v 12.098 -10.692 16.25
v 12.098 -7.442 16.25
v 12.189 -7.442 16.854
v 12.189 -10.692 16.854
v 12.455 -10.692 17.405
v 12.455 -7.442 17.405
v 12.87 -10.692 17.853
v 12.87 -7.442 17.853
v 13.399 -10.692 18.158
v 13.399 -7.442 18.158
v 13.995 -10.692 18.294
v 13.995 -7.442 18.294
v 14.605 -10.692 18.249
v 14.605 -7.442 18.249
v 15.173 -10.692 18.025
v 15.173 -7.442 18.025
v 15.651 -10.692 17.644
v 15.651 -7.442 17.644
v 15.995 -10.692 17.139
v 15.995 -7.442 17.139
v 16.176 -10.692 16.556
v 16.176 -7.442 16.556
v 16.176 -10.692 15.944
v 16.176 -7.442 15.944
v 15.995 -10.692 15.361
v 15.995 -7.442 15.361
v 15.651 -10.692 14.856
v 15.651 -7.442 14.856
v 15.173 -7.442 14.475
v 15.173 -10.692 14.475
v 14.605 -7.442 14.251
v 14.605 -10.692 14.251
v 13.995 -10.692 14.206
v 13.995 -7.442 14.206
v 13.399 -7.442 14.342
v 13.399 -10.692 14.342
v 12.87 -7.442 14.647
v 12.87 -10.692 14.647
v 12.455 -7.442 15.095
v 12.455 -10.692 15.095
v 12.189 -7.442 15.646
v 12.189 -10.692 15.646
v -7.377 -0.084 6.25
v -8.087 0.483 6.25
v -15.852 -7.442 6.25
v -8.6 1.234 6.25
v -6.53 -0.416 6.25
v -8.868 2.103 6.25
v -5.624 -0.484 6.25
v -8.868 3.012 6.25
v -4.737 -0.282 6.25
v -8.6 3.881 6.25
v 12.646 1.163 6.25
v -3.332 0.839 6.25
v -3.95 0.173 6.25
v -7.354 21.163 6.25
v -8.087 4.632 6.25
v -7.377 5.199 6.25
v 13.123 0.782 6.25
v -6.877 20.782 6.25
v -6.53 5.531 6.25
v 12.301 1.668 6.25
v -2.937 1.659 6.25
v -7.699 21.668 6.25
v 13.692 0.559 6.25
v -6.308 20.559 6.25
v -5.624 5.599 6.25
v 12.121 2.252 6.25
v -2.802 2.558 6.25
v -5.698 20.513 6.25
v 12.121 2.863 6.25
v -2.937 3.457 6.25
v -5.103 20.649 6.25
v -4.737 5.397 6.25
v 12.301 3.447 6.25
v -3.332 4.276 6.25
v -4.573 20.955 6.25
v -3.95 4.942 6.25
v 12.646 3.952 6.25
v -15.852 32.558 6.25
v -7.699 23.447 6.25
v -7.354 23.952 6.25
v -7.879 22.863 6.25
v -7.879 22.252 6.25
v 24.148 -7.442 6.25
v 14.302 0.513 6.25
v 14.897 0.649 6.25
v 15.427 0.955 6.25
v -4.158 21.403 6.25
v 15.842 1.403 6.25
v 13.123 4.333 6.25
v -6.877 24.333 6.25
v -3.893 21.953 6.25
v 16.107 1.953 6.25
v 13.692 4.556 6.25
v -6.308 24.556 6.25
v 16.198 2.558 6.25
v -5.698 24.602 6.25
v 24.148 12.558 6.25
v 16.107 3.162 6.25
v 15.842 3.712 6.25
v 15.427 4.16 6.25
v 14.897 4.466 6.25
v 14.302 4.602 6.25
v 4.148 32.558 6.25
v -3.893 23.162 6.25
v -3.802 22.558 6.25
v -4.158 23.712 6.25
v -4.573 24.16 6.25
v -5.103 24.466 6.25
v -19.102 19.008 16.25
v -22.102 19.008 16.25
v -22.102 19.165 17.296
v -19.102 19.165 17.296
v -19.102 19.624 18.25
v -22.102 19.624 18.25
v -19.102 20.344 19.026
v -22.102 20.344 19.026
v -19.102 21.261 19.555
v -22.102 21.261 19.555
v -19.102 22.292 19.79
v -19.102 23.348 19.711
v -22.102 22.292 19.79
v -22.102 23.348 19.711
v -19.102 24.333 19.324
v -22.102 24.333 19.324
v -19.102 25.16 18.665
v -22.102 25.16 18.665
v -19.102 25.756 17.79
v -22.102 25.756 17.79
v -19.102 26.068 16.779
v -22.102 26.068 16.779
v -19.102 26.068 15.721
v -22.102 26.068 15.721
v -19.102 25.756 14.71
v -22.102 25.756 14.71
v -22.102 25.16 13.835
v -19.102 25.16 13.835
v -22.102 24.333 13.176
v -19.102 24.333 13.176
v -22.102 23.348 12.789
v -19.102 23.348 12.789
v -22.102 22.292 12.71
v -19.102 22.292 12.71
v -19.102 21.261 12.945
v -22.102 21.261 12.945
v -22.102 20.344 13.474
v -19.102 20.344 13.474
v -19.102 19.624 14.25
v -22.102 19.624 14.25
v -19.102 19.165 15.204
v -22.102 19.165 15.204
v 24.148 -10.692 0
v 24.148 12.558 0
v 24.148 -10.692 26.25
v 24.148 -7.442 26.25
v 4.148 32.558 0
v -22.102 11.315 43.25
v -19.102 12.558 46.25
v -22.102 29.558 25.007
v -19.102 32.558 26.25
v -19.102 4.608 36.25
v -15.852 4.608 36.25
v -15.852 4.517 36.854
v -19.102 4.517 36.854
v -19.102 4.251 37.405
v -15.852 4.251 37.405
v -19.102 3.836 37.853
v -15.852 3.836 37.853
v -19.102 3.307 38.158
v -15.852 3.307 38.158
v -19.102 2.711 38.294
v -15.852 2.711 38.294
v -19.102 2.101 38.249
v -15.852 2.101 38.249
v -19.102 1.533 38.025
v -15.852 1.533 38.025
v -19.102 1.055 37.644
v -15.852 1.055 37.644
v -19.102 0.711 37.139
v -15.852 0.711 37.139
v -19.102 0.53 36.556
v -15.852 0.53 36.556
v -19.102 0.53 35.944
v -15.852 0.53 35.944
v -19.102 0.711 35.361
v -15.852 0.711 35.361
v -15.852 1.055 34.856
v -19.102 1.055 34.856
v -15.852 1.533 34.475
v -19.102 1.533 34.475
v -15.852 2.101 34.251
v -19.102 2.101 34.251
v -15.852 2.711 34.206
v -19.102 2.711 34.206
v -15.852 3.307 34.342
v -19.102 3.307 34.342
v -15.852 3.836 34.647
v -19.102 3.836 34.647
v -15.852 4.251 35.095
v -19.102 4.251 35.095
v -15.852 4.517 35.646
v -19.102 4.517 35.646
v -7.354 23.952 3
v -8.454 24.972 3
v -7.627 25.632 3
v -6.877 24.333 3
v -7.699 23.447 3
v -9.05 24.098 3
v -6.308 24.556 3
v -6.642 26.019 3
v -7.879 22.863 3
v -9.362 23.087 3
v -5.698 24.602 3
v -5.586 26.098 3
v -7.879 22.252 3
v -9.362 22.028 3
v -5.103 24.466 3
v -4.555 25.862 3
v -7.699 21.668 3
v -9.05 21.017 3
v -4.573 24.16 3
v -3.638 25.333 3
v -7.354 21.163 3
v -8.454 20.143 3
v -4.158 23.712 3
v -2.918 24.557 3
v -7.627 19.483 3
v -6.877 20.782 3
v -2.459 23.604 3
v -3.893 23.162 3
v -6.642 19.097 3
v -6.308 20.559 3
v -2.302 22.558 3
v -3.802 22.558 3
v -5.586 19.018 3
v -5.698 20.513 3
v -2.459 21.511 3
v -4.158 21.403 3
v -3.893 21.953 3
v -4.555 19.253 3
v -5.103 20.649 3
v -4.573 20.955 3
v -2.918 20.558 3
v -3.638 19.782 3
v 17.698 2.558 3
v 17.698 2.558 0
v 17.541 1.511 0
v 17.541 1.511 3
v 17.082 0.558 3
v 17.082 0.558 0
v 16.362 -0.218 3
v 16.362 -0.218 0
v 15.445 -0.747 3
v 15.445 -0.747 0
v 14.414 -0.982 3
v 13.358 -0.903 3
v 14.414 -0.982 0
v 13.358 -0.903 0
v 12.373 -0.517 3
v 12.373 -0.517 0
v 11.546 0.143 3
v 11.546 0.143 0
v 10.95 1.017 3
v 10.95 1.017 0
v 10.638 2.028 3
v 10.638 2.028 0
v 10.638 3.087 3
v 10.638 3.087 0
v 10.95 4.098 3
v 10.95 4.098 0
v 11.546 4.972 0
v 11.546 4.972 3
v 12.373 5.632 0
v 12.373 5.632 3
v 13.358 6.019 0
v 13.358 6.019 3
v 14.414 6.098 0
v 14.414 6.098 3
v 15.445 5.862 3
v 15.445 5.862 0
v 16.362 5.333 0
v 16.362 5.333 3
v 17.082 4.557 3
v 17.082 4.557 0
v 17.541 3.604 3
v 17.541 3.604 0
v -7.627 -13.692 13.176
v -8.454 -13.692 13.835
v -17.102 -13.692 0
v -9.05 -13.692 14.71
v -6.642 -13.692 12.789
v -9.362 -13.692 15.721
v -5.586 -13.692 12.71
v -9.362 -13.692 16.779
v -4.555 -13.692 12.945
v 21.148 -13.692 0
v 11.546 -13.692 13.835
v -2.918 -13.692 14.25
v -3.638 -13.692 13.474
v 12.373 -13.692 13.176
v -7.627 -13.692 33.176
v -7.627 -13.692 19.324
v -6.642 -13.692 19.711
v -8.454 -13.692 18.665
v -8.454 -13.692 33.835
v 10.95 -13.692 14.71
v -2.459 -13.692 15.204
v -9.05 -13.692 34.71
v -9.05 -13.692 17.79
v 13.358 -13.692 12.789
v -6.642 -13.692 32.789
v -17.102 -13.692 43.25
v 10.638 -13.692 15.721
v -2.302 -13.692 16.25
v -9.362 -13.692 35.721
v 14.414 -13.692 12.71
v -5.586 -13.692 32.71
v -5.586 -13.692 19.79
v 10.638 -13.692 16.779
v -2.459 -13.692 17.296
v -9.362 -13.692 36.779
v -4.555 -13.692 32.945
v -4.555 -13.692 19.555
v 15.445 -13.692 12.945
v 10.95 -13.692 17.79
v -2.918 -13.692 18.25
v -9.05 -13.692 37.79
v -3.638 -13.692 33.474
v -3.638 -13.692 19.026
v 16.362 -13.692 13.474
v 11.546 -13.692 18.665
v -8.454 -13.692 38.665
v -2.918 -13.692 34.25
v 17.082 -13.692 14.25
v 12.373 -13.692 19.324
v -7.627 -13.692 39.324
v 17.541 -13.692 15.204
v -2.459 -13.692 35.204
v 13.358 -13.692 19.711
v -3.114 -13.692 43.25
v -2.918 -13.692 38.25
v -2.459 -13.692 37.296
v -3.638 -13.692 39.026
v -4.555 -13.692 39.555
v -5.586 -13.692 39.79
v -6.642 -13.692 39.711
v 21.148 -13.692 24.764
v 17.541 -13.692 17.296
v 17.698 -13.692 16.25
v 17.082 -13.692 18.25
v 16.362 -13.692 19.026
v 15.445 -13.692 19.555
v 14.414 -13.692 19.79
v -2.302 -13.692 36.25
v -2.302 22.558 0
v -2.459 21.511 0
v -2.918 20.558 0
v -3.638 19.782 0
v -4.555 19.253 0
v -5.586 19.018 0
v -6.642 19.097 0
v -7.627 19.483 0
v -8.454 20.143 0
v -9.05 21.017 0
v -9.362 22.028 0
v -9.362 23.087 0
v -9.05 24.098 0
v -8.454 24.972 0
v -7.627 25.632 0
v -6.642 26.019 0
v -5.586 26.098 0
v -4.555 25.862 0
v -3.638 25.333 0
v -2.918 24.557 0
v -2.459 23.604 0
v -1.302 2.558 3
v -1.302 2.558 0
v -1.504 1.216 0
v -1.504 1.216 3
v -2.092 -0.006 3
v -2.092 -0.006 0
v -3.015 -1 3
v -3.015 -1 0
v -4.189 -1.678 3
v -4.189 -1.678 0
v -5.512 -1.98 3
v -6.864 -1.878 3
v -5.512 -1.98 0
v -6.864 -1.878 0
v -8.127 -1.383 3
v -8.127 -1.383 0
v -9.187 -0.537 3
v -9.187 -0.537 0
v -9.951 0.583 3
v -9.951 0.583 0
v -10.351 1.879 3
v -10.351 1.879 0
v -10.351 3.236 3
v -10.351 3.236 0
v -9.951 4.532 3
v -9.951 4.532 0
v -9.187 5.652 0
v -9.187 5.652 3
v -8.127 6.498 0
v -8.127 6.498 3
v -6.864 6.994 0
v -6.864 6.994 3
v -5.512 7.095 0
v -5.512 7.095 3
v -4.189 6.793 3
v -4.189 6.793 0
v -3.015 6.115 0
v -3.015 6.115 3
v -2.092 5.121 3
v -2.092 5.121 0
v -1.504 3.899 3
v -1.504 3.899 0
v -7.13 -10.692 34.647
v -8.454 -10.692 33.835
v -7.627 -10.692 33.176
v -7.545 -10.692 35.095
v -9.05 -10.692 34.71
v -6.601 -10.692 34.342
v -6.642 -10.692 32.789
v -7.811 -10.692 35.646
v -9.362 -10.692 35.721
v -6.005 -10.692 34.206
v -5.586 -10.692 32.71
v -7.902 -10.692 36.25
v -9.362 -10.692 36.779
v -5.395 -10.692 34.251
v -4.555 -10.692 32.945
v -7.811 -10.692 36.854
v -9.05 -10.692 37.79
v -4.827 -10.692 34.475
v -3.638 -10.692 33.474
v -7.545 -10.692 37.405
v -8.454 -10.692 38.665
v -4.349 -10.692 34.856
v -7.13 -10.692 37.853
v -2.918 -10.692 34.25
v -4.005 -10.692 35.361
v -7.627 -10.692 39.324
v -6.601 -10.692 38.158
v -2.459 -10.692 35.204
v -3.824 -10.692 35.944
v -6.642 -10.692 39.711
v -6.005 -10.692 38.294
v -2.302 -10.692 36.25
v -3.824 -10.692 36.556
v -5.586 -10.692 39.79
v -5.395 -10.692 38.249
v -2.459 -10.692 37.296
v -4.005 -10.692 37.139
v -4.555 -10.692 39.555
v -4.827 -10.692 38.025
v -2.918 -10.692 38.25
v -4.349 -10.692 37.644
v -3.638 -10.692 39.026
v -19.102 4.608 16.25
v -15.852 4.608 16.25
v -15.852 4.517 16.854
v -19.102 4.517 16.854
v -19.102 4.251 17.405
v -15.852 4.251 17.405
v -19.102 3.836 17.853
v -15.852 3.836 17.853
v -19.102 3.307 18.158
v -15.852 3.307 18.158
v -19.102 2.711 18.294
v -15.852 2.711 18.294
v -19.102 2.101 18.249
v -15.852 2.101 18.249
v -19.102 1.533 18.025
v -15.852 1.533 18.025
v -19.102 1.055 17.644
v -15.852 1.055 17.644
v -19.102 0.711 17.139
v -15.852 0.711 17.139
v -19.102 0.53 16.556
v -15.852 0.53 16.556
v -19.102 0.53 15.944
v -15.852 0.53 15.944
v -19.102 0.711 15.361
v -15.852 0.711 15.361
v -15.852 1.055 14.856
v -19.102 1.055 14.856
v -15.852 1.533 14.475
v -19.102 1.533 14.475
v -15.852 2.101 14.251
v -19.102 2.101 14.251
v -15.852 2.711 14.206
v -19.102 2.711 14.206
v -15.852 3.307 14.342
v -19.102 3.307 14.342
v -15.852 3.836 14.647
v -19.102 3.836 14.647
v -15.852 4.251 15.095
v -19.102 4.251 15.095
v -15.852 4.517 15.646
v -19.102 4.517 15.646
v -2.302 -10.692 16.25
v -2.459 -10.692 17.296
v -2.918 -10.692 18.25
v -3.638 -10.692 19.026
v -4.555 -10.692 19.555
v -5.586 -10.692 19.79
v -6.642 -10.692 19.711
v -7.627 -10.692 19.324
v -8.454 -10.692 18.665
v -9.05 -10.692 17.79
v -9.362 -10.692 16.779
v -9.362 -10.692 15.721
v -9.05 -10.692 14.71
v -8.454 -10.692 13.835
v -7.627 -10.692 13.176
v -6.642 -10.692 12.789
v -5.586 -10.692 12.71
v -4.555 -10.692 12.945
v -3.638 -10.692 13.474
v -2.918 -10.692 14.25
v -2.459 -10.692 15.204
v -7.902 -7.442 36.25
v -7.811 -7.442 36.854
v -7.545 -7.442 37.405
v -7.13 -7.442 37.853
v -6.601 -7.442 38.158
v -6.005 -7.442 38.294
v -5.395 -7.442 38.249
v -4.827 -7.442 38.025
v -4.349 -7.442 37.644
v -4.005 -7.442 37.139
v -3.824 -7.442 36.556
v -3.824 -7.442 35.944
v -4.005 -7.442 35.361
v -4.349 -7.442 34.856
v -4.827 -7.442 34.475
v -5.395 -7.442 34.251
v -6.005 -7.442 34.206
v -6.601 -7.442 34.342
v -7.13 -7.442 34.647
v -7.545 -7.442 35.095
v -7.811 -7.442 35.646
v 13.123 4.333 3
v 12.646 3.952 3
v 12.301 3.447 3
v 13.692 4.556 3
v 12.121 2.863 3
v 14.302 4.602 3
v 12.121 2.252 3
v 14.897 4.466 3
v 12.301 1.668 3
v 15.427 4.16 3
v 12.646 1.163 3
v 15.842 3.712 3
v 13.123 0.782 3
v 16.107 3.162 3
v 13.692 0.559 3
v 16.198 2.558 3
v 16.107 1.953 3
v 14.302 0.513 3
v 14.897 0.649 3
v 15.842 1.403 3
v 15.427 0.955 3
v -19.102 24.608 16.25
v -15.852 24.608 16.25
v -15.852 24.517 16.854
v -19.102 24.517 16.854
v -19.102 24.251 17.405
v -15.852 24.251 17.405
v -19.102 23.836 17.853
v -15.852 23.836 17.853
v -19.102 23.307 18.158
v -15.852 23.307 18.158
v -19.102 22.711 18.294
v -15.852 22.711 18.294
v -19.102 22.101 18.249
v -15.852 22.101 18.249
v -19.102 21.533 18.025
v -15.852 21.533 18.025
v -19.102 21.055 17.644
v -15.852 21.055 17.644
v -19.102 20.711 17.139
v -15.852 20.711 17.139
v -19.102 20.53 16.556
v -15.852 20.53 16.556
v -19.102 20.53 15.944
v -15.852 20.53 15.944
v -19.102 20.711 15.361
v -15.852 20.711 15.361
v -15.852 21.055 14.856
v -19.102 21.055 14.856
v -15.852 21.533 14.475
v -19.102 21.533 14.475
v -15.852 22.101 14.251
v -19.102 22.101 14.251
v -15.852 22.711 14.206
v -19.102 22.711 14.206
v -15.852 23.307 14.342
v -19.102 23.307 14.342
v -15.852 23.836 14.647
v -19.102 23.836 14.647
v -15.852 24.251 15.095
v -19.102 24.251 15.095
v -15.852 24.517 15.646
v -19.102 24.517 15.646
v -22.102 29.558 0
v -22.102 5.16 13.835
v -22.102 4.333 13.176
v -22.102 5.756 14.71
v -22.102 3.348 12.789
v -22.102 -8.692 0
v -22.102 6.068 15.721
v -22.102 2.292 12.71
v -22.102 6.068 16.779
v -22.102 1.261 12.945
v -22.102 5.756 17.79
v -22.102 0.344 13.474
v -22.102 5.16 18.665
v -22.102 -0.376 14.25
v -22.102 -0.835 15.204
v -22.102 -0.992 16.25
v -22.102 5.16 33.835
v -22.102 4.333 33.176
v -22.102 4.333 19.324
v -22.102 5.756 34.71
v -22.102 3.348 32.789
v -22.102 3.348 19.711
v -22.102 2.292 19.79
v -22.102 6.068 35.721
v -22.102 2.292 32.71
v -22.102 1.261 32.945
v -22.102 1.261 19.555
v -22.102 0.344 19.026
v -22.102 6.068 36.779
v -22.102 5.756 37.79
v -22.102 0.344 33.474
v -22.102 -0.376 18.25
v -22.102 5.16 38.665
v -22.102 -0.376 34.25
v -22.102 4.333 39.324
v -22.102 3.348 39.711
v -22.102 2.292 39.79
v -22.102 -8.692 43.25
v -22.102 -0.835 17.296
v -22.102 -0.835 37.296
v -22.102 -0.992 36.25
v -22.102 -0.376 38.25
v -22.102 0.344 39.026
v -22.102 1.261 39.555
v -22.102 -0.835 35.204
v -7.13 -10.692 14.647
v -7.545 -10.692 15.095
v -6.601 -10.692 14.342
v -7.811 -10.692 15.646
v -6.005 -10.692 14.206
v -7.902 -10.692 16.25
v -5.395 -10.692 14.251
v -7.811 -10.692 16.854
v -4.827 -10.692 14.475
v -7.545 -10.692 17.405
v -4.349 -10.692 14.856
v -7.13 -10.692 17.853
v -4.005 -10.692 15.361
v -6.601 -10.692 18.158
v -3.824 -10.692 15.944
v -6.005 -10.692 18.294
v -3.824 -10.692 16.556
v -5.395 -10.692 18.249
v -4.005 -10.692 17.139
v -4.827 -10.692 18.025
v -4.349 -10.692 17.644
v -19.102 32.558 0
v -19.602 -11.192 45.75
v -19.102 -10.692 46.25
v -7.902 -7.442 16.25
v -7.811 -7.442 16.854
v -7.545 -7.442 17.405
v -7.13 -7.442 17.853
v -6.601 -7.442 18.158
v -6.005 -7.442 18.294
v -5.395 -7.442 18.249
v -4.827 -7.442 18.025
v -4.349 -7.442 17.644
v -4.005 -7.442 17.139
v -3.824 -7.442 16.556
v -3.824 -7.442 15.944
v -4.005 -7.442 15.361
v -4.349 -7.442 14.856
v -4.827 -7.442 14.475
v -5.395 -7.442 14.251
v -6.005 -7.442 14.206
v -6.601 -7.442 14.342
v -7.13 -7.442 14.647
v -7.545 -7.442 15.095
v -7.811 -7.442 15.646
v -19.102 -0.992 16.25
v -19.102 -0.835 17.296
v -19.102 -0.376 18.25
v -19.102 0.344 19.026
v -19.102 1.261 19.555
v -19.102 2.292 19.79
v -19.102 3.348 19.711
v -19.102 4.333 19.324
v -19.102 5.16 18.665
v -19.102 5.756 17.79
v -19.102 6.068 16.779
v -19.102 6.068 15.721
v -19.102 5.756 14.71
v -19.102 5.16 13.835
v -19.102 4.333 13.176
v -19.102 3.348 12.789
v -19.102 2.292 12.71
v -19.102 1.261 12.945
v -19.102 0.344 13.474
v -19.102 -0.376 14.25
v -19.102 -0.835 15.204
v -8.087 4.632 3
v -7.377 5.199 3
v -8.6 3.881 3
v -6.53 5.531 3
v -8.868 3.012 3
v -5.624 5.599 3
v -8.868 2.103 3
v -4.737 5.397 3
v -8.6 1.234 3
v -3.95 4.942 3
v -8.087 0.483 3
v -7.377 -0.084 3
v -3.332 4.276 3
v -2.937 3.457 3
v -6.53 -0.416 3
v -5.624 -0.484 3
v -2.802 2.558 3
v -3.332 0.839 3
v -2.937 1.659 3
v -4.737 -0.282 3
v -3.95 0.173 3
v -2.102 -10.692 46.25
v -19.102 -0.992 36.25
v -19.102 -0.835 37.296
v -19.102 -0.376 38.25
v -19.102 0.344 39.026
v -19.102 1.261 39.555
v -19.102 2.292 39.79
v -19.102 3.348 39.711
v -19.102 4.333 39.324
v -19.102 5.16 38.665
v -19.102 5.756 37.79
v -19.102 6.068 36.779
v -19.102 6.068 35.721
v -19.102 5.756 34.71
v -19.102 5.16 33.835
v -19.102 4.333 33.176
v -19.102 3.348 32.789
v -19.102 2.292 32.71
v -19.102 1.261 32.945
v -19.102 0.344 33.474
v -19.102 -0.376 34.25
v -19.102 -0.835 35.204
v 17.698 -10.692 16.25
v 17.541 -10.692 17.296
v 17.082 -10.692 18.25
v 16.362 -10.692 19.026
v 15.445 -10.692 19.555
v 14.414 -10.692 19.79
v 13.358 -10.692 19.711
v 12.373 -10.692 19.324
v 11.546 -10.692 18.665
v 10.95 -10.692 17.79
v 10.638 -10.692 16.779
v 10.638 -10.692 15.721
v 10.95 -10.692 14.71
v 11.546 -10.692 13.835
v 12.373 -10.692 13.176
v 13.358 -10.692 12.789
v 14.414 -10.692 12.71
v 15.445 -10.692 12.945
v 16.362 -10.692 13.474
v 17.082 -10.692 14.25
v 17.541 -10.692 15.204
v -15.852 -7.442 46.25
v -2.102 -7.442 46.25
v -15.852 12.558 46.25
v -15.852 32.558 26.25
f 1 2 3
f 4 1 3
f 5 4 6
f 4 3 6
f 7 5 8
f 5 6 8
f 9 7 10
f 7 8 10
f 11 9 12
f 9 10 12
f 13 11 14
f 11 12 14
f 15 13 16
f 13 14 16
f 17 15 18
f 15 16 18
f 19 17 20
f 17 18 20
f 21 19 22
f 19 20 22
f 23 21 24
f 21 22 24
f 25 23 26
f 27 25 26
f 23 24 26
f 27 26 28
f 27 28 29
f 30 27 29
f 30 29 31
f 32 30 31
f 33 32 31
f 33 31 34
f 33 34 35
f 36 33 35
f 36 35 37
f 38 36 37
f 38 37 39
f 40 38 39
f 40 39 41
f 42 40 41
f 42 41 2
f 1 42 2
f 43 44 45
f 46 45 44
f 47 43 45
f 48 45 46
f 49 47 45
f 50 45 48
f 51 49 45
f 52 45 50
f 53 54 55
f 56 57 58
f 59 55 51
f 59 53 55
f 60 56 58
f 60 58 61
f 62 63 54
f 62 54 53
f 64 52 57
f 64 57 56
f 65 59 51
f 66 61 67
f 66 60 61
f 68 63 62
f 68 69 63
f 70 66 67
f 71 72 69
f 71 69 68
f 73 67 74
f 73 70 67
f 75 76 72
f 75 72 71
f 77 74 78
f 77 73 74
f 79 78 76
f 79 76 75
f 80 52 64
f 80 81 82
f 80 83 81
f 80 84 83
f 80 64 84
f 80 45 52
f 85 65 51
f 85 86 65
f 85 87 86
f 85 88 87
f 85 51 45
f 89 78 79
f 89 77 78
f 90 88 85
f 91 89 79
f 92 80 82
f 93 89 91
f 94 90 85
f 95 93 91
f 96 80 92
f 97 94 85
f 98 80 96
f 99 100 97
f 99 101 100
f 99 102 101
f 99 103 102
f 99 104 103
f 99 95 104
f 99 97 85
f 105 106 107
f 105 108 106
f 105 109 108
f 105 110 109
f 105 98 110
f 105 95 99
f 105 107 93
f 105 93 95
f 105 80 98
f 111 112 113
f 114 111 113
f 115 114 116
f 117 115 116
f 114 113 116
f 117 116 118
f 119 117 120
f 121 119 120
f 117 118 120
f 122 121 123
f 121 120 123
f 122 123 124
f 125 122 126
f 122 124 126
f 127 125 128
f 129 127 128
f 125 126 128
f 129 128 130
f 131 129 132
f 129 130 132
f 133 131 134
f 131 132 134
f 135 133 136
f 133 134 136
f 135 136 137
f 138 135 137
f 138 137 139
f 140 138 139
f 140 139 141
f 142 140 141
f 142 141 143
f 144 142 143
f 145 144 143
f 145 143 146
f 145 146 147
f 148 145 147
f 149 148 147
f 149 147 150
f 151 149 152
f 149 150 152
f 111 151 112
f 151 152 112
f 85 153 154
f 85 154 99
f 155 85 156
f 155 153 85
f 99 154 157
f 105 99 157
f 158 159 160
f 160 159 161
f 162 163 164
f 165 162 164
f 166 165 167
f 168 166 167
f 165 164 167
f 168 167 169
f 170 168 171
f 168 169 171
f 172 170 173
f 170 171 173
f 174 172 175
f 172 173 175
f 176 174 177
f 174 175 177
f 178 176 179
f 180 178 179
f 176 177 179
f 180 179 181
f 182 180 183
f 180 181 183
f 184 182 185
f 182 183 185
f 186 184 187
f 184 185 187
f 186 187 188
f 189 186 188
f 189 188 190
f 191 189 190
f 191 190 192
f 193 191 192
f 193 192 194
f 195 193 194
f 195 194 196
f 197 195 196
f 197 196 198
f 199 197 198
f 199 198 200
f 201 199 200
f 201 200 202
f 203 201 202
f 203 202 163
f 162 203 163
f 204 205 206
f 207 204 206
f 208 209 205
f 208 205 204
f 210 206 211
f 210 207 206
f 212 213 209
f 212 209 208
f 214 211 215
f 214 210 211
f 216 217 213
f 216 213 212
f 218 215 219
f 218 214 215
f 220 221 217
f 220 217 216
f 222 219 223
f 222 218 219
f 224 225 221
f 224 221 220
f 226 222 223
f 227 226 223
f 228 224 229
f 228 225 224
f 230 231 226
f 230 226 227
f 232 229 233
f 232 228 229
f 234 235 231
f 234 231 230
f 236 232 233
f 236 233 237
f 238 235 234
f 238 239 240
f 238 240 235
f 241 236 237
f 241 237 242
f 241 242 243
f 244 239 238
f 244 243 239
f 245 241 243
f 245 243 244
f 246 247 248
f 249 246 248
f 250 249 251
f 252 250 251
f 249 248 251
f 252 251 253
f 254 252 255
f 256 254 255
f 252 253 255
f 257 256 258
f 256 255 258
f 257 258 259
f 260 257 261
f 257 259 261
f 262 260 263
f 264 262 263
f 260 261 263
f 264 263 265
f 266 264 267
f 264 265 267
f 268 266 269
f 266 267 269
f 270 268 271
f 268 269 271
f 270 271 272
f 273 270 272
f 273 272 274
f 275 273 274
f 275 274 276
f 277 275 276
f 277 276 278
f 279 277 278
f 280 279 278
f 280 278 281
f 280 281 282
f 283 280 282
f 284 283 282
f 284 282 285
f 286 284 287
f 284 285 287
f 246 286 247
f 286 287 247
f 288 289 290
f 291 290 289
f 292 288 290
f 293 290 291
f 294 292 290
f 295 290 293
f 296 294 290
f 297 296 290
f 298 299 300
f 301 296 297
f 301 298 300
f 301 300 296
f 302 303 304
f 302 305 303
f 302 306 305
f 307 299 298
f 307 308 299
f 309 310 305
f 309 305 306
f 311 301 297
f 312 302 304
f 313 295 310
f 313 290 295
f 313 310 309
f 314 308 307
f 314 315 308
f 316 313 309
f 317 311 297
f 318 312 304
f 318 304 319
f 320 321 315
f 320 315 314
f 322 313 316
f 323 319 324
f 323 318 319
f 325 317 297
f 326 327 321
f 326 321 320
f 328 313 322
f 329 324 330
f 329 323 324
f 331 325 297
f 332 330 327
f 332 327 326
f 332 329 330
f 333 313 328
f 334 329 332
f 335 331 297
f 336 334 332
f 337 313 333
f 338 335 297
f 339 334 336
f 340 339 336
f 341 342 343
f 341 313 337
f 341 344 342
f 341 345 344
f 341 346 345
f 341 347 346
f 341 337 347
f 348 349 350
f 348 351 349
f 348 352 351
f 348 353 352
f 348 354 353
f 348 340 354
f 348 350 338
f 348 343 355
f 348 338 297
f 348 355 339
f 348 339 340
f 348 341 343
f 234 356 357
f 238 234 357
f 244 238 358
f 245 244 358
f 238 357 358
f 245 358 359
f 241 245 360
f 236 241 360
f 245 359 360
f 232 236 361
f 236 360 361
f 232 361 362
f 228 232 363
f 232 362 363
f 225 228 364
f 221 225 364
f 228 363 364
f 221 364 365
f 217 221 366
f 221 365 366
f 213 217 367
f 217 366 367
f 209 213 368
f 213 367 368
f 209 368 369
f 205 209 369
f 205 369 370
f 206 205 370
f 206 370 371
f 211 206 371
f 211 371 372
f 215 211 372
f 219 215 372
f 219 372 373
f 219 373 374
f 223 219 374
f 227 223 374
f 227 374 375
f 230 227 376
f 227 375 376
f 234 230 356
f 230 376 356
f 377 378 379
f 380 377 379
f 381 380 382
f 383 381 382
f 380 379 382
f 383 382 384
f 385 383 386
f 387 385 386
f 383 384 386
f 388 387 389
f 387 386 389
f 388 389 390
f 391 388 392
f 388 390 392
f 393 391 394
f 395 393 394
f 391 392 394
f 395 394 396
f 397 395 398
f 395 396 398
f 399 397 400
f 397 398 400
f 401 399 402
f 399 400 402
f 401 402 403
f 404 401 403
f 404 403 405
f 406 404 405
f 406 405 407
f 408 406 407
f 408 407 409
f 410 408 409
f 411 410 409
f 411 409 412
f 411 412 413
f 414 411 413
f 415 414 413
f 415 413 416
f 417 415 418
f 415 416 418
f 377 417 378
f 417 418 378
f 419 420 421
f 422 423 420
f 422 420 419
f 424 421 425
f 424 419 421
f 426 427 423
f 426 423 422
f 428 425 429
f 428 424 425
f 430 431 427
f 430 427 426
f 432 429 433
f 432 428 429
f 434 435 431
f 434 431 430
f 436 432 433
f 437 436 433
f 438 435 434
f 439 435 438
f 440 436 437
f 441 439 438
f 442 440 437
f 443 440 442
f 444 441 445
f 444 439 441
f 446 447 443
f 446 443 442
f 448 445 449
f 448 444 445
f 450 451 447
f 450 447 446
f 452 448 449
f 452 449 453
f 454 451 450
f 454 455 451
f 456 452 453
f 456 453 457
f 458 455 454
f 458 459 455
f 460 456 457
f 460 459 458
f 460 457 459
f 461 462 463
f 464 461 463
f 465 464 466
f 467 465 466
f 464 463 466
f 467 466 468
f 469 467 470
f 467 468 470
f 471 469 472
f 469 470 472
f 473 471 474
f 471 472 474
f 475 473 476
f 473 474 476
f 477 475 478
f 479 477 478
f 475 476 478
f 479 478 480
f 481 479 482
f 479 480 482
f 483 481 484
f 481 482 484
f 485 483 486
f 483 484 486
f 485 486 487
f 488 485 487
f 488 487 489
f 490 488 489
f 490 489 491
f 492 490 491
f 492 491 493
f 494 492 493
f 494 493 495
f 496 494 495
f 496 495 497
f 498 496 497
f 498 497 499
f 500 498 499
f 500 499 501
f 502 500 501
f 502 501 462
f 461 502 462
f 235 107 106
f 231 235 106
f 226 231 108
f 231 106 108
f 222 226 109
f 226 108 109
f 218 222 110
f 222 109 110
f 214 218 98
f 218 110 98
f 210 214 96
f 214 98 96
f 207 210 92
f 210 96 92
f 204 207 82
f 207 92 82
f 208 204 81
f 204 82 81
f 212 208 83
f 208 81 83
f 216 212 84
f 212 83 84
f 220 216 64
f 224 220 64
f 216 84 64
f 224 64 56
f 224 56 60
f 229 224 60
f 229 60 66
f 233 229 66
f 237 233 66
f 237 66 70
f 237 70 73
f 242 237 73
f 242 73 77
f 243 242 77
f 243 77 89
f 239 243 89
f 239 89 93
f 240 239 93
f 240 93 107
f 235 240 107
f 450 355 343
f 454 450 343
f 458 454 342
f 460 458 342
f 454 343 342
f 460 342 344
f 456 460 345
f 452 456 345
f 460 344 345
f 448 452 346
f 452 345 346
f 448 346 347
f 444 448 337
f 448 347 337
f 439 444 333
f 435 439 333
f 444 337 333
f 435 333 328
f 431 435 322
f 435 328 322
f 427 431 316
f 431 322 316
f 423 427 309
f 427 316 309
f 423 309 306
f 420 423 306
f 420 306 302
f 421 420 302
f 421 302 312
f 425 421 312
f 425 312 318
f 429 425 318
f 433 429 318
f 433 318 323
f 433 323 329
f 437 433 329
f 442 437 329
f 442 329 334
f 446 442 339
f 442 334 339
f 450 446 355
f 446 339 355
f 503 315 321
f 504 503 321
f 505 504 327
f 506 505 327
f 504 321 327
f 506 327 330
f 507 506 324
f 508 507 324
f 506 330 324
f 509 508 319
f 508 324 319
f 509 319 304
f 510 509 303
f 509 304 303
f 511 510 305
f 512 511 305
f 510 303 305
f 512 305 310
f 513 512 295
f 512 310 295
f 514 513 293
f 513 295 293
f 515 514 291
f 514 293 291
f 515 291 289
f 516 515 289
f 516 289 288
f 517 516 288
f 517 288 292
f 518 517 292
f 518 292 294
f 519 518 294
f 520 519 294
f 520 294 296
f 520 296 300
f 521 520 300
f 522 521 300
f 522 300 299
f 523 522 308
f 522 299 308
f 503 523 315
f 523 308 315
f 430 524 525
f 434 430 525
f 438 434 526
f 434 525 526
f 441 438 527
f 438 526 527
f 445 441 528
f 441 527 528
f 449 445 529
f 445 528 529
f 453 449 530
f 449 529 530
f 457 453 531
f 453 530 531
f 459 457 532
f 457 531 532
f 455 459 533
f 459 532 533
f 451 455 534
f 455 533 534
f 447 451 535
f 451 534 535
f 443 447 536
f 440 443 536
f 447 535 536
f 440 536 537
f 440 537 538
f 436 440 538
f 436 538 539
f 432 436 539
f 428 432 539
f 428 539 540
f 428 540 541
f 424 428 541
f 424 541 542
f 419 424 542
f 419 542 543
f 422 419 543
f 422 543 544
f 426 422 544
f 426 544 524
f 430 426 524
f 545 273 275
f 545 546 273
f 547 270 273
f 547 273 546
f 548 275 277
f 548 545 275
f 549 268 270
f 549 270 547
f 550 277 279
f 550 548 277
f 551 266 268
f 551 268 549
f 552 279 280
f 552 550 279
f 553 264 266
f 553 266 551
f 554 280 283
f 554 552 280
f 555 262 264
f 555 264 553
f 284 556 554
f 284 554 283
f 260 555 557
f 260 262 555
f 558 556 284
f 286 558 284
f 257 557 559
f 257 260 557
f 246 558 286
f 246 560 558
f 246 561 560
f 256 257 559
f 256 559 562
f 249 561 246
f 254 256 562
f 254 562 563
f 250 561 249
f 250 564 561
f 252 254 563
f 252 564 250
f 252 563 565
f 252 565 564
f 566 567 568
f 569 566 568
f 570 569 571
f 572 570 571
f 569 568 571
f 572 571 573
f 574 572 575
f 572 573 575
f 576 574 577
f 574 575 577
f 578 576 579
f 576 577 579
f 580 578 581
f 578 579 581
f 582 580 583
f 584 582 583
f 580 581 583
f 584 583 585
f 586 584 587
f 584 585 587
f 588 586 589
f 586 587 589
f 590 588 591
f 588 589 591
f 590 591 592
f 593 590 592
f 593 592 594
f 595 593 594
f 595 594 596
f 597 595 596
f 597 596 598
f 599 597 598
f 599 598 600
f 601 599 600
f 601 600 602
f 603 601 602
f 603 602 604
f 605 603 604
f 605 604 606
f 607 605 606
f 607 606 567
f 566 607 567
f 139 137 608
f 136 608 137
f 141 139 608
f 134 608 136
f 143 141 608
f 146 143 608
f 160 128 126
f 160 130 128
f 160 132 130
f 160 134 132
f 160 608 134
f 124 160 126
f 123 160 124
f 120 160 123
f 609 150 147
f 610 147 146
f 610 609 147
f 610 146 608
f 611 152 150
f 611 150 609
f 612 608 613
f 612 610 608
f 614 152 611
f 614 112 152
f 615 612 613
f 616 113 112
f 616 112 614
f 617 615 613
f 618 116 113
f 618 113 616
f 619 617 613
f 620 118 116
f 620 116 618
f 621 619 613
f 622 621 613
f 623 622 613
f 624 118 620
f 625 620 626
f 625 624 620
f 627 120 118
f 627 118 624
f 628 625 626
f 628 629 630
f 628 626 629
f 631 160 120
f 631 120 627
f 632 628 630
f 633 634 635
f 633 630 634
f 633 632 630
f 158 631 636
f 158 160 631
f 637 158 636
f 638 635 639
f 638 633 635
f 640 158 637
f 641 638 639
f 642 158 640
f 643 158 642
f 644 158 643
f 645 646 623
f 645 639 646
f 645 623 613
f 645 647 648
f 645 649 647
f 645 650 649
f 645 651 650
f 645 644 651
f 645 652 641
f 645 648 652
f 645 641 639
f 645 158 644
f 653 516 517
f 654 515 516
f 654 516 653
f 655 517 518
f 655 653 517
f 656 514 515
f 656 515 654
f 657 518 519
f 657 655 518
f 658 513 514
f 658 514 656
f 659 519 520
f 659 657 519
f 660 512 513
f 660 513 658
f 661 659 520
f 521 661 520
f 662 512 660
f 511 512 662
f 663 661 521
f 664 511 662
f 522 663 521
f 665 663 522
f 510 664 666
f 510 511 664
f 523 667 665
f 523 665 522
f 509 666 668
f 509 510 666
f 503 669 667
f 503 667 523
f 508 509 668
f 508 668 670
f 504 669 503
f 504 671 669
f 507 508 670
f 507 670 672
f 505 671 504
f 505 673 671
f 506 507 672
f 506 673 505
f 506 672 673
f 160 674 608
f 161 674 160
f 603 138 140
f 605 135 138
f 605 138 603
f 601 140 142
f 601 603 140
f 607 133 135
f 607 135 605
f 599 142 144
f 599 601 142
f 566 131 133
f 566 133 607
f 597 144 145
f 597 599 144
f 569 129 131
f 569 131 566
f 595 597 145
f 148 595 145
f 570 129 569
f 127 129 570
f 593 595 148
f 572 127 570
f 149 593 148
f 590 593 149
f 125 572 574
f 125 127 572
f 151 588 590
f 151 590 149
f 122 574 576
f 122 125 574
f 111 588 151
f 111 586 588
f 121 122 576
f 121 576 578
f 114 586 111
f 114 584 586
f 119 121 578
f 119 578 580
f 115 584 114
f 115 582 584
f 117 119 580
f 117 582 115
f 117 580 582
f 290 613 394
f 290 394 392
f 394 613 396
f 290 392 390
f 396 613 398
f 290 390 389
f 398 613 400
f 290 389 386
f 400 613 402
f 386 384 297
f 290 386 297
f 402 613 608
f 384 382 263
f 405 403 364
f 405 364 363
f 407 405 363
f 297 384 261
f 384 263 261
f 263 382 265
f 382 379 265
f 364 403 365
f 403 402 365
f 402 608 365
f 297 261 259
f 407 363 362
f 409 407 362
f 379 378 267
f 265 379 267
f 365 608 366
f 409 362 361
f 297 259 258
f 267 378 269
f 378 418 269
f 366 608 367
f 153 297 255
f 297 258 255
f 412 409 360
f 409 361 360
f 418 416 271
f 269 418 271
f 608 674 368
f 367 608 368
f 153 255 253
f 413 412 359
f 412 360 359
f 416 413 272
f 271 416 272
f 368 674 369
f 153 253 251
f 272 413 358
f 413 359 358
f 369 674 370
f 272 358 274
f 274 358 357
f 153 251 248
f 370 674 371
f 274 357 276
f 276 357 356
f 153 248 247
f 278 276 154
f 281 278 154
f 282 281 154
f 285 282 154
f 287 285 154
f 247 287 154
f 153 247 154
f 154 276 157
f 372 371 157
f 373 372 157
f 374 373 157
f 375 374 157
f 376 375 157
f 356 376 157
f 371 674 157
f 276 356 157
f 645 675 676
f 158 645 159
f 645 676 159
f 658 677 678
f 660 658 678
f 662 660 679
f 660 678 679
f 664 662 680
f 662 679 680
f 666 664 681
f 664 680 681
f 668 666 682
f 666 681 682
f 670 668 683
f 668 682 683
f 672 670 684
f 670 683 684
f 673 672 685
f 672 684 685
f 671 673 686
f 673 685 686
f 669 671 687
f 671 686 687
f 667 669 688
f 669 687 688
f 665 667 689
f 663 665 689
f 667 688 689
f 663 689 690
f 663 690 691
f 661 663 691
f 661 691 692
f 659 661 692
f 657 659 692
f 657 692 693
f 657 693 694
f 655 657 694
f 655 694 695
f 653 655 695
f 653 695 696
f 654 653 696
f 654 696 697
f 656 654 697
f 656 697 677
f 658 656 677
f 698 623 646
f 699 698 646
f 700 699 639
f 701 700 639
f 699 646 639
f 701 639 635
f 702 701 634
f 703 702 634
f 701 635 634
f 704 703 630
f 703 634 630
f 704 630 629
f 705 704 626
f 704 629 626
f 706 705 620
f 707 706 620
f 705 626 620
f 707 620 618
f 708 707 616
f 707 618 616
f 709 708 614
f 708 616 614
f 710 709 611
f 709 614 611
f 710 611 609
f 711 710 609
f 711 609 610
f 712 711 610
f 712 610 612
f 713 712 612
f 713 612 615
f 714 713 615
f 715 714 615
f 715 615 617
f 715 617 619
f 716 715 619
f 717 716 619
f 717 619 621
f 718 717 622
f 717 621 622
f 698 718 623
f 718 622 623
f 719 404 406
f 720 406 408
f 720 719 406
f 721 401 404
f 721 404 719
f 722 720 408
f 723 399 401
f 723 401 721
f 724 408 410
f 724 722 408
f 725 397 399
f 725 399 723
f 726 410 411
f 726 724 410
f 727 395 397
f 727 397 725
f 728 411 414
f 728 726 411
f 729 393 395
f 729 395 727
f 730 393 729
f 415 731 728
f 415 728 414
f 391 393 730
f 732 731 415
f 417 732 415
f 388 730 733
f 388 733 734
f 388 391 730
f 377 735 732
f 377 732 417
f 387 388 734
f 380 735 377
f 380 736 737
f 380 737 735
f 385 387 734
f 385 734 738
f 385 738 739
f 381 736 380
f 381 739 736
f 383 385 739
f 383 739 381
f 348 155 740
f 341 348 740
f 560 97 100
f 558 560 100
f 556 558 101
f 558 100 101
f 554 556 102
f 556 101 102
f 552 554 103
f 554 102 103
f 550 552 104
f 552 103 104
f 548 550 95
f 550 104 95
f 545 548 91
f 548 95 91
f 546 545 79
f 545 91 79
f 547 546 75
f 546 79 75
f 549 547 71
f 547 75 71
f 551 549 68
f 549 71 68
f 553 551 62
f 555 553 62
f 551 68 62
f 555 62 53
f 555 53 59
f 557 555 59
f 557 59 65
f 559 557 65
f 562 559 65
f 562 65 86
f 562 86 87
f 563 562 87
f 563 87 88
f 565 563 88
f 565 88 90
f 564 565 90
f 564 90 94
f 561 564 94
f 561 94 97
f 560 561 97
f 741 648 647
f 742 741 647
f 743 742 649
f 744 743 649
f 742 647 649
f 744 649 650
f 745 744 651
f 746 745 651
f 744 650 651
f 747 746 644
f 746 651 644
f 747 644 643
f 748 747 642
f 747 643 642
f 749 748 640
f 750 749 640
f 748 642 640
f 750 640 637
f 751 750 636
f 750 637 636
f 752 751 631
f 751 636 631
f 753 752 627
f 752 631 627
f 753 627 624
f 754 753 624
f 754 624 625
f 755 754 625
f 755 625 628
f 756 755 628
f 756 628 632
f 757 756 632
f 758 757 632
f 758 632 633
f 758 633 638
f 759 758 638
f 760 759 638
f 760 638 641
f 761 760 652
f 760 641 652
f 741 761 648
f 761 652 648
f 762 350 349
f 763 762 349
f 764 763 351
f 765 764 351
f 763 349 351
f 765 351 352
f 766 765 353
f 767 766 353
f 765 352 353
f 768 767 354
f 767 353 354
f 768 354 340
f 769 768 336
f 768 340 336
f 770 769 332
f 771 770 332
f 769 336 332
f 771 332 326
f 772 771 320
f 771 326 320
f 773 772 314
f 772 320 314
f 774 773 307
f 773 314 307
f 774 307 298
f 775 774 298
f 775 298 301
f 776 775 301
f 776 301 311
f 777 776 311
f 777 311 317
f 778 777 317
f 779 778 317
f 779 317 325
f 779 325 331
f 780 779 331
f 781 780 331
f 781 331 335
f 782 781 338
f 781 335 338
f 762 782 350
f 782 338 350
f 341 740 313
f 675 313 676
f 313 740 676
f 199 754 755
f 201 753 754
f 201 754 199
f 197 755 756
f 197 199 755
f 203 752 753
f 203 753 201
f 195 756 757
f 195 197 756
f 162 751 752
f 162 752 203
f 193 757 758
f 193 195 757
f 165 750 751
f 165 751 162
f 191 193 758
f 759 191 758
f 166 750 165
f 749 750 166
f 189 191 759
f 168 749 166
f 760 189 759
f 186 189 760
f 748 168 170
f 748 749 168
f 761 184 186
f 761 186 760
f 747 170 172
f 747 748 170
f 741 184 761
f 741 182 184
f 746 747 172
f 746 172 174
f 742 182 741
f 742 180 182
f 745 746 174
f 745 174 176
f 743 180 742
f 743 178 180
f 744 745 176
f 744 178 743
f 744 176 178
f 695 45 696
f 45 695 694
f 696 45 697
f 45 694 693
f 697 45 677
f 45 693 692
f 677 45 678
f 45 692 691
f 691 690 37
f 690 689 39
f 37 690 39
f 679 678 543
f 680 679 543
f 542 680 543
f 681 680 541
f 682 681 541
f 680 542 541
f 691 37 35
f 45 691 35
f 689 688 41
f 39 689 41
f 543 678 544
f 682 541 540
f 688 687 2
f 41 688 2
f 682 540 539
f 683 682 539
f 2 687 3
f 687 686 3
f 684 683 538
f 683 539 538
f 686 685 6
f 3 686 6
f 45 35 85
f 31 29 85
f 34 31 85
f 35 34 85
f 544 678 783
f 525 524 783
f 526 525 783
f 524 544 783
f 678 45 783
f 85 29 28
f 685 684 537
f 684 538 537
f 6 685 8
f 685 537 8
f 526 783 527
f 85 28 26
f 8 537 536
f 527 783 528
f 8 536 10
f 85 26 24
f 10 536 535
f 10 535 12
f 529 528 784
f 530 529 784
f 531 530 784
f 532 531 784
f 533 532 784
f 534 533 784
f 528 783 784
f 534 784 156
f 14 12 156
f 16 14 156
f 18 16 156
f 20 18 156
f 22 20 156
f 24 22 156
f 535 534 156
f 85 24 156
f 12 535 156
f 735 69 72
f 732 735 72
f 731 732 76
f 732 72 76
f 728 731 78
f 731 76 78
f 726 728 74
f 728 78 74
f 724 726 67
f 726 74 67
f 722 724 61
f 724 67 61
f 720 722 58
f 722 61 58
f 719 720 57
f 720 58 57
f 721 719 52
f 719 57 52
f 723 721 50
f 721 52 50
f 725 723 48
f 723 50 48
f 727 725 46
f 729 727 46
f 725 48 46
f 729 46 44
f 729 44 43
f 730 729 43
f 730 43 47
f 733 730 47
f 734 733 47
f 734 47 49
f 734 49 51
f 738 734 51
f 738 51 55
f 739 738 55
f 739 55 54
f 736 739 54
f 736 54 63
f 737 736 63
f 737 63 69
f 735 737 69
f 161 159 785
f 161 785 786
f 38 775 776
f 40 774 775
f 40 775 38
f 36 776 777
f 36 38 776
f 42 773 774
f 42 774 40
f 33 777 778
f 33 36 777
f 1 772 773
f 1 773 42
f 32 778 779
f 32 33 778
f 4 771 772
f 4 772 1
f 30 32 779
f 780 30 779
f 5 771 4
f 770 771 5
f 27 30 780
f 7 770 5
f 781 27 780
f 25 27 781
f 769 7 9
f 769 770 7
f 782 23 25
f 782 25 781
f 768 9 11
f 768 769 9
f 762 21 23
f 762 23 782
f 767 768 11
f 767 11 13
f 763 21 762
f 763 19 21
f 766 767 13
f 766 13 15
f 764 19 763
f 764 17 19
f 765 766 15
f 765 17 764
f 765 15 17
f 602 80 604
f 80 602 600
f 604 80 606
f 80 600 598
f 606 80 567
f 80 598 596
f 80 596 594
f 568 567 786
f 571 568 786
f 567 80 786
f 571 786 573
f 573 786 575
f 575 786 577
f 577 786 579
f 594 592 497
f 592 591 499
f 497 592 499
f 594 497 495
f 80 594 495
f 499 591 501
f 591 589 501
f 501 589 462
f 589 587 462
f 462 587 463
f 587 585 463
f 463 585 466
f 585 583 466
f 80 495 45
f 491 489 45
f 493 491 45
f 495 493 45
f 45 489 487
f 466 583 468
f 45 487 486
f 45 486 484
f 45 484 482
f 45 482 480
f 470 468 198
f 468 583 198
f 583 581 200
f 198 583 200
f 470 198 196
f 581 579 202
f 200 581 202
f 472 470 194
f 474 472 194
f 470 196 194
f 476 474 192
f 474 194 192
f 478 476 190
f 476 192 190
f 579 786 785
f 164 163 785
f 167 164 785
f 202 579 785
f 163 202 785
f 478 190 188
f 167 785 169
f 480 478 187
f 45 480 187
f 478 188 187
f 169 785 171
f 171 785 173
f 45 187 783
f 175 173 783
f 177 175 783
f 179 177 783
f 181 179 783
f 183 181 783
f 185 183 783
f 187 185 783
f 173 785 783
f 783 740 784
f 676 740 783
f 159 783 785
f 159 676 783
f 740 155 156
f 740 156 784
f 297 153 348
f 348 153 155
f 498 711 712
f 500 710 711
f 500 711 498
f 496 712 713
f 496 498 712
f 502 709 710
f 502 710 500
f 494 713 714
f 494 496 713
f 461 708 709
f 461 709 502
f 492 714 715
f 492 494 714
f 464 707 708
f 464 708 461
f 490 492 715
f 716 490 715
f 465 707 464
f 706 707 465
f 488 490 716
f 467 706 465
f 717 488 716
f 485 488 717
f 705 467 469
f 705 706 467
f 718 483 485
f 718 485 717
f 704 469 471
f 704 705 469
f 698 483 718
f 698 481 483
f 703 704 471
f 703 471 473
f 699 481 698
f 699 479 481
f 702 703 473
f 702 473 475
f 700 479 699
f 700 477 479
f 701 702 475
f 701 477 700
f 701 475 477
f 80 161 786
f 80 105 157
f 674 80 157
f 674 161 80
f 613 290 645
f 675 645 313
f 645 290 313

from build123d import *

# Parameters (mm, degrees)
F1_DEPTH  = 6.25
F3_DEPTH  = 6.25
F5_DEPTH  = 6.25
F6_R      = 2.05
F6_R_2    = 3.05
F7_DEPTH  = 25
F8_R      = 2.05
F9_DEPTH  = 25
F10_R     = 2.05
F11_DEPTH = 25
F13_R     = 3.55
F14_DEPTH = 3
F15_R     = 3.55
F16_DEPTH = 3
F17_R     = 3.55
F17_R_2   = 4.55
F18_DEPTH = 3
F19_SIZE  = 5
F20_SIZE  = 3


with BuildPart() as f1:
    # F0 (on Top) → F1 (new body)
    with BuildSketch(Plane.XY):
        Polygon((4.1484118214, 32.5575917727), (-22.1015881786, 32.5575917727), (-22.1015881786, -13.6924082273), (24.1484118214, -13.6924082273), (24.1484118214, 12.5575917727), align=None)
    extrude(amount=F1_DEPTH)

    # F6 (on face) → F7 (cut)
    with BuildSketch(Plane.XY.offset(6.25)):
        with Locations((-5.8515881786, 22.5575917727)):
            Circle(F6_R)
        with Locations((-5.8515881786, 2.5575917727)):
            Circle(F6_R_2)
        with Locations((14.1484118214, 2.5575917727)):
            Circle(F6_R)
    extrude(amount=-F7_DEPTH, mode=Mode.SUBTRACT)


with BuildPart() as f3:
    # F2 (on face) → F3 (new body)
    with BuildSketch(Plane.XZ.offset(13.6924082273)):
        Polygon((-22.1015881786, 46.25), (-22.1015881786, 6.25), (24.1484118214, 6.25), (24.1484118214, 26.25), (-2.1015881786, 46.25), align=None)
    extrude(amount=-F3_DEPTH)

    # F8 (on face) → F9 (cut)
    with BuildSketch(Plane(origin=(0, -7.4424082273, 0), x_dir=(-1, 0, 0), z_dir=(0, 1, 0))):
        with Locations((5.8515881786, 16.25)):
            Circle(F8_R)
        with Locations((-14.1484118214, 16.25)):
            Circle(F8_R)
        with Locations((5.8515881786, 36.25)):
            Circle(F8_R)
    extrude(amount=-F9_DEPTH, mode=Mode.SUBTRACT)


with BuildPart() as f5:
    # F4 (on face) → F5 (new body)
    with BuildSketch(Plane(origin=(-22.1015881786, 0, 0), x_dir=(0, -1, 0), z_dir=(-1, 0, 0))):
        Polygon((-32.5575917727, 6.25), (7.4424082273, 6.25), (7.4424082273, 46.25), (-12.5575917727, 46.25), (-32.5575917727, 26.25), align=None)
    extrude(amount=-F5_DEPTH)

    # F10 (on face) → F11 (cut)
    with BuildSketch(Plane.YZ.offset(-15.8515881786)):
        with Locations((22.5575917727, 16.25)):
            Circle(F10_R)
        with Locations((2.5575917727, 16.25)):
            Circle(F10_R)
        with Locations((2.5575917727, 36.25)):
            Circle(F10_R)
    extrude(amount=-F11_DEPTH, mode=Mode.SUBTRACT)


with BuildPart() as f1_1:
    add(f1.part)

    # F12: union F3, F5
    add(f3.part)
    add(f5.part)

    # F13 (on face) → F14 (cut)
    with BuildSketch(Plane.XZ.offset(13.6924082273)):
        with Locations((-5.8515881786, 36.25)):
            Circle(F13_R)
        with Locations((14.1484118214, 16.25)):
            Circle(F13_R)
        with Locations((-5.8515881786, 16.25)):
            Circle(F13_R)
    extrude(amount=-F14_DEPTH, mode=Mode.SUBTRACT)

    # F15 (on face) → F16 (cut)
    with BuildSketch(Plane(origin=(-22.1015881786, 0, 0), x_dir=(0, -1, 0), z_dir=(-1, 0, 0))):
        with Locations((-2.5575917727, 36.25)):
            Circle(F15_R)
        with Locations((-2.5575917727, 16.25)):
            Circle(F15_R)
        with Locations((-22.5575917727, 16.25)):
            Circle(F15_R)
    extrude(amount=-F16_DEPTH, mode=Mode.SUBTRACT)

    # F17 (on face) → F18 (cut)
    with BuildSketch(Plane(origin=(0, 0, 0), x_dir=(1, 0, 0), z_dir=(0, 0, -1))):
        with Locations((-5.8515881786, -22.5575917727)):
            Circle(F17_R)
        with Locations((-5.8515881786, -2.5575917727)):
            Circle(F17_R_2)
        with Locations((14.1484118214, -2.5575917727)):
            Circle(F17_R)
    extrude(amount=-F18_DEPTH, mode=Mode.SUBTRACT)

    # F19
    f19_edges = [f1_1.edges().sort_by_distance(p)[0] for p in [
        (-22.101588, -13.692408, 23.125),
    ]]
    chamfer(f19_edges, length=F19_SIZE)

    # F20 (call 1 of 2: OpenCascade refuses the feature's edges together)
    f20_edges = [f1_1.edges().sort_by_distance(p)[0] for p in [
        (-9.601588, -13.692408, 46.25),
        (11.023412, -13.692408, 36.25),
        (24.148412, -13.692408, 13.125),
    ]]
    chamfer(f20_edges, length=F20_SIZE)

    # F20#2 (call 2 of 2)
    f20_2_edges = [f1_1.edges().sort_by_distance(p)[0] for p in [
        (-22.101588, 1.932592, 46.25),
        (-22.101588, 22.557592, 36.25),
        (-22.101588, 32.557592, 13.125),
    ]]
    chamfer(f20_2_edges, length=F20_SIZE)


solid = f1_1.part
